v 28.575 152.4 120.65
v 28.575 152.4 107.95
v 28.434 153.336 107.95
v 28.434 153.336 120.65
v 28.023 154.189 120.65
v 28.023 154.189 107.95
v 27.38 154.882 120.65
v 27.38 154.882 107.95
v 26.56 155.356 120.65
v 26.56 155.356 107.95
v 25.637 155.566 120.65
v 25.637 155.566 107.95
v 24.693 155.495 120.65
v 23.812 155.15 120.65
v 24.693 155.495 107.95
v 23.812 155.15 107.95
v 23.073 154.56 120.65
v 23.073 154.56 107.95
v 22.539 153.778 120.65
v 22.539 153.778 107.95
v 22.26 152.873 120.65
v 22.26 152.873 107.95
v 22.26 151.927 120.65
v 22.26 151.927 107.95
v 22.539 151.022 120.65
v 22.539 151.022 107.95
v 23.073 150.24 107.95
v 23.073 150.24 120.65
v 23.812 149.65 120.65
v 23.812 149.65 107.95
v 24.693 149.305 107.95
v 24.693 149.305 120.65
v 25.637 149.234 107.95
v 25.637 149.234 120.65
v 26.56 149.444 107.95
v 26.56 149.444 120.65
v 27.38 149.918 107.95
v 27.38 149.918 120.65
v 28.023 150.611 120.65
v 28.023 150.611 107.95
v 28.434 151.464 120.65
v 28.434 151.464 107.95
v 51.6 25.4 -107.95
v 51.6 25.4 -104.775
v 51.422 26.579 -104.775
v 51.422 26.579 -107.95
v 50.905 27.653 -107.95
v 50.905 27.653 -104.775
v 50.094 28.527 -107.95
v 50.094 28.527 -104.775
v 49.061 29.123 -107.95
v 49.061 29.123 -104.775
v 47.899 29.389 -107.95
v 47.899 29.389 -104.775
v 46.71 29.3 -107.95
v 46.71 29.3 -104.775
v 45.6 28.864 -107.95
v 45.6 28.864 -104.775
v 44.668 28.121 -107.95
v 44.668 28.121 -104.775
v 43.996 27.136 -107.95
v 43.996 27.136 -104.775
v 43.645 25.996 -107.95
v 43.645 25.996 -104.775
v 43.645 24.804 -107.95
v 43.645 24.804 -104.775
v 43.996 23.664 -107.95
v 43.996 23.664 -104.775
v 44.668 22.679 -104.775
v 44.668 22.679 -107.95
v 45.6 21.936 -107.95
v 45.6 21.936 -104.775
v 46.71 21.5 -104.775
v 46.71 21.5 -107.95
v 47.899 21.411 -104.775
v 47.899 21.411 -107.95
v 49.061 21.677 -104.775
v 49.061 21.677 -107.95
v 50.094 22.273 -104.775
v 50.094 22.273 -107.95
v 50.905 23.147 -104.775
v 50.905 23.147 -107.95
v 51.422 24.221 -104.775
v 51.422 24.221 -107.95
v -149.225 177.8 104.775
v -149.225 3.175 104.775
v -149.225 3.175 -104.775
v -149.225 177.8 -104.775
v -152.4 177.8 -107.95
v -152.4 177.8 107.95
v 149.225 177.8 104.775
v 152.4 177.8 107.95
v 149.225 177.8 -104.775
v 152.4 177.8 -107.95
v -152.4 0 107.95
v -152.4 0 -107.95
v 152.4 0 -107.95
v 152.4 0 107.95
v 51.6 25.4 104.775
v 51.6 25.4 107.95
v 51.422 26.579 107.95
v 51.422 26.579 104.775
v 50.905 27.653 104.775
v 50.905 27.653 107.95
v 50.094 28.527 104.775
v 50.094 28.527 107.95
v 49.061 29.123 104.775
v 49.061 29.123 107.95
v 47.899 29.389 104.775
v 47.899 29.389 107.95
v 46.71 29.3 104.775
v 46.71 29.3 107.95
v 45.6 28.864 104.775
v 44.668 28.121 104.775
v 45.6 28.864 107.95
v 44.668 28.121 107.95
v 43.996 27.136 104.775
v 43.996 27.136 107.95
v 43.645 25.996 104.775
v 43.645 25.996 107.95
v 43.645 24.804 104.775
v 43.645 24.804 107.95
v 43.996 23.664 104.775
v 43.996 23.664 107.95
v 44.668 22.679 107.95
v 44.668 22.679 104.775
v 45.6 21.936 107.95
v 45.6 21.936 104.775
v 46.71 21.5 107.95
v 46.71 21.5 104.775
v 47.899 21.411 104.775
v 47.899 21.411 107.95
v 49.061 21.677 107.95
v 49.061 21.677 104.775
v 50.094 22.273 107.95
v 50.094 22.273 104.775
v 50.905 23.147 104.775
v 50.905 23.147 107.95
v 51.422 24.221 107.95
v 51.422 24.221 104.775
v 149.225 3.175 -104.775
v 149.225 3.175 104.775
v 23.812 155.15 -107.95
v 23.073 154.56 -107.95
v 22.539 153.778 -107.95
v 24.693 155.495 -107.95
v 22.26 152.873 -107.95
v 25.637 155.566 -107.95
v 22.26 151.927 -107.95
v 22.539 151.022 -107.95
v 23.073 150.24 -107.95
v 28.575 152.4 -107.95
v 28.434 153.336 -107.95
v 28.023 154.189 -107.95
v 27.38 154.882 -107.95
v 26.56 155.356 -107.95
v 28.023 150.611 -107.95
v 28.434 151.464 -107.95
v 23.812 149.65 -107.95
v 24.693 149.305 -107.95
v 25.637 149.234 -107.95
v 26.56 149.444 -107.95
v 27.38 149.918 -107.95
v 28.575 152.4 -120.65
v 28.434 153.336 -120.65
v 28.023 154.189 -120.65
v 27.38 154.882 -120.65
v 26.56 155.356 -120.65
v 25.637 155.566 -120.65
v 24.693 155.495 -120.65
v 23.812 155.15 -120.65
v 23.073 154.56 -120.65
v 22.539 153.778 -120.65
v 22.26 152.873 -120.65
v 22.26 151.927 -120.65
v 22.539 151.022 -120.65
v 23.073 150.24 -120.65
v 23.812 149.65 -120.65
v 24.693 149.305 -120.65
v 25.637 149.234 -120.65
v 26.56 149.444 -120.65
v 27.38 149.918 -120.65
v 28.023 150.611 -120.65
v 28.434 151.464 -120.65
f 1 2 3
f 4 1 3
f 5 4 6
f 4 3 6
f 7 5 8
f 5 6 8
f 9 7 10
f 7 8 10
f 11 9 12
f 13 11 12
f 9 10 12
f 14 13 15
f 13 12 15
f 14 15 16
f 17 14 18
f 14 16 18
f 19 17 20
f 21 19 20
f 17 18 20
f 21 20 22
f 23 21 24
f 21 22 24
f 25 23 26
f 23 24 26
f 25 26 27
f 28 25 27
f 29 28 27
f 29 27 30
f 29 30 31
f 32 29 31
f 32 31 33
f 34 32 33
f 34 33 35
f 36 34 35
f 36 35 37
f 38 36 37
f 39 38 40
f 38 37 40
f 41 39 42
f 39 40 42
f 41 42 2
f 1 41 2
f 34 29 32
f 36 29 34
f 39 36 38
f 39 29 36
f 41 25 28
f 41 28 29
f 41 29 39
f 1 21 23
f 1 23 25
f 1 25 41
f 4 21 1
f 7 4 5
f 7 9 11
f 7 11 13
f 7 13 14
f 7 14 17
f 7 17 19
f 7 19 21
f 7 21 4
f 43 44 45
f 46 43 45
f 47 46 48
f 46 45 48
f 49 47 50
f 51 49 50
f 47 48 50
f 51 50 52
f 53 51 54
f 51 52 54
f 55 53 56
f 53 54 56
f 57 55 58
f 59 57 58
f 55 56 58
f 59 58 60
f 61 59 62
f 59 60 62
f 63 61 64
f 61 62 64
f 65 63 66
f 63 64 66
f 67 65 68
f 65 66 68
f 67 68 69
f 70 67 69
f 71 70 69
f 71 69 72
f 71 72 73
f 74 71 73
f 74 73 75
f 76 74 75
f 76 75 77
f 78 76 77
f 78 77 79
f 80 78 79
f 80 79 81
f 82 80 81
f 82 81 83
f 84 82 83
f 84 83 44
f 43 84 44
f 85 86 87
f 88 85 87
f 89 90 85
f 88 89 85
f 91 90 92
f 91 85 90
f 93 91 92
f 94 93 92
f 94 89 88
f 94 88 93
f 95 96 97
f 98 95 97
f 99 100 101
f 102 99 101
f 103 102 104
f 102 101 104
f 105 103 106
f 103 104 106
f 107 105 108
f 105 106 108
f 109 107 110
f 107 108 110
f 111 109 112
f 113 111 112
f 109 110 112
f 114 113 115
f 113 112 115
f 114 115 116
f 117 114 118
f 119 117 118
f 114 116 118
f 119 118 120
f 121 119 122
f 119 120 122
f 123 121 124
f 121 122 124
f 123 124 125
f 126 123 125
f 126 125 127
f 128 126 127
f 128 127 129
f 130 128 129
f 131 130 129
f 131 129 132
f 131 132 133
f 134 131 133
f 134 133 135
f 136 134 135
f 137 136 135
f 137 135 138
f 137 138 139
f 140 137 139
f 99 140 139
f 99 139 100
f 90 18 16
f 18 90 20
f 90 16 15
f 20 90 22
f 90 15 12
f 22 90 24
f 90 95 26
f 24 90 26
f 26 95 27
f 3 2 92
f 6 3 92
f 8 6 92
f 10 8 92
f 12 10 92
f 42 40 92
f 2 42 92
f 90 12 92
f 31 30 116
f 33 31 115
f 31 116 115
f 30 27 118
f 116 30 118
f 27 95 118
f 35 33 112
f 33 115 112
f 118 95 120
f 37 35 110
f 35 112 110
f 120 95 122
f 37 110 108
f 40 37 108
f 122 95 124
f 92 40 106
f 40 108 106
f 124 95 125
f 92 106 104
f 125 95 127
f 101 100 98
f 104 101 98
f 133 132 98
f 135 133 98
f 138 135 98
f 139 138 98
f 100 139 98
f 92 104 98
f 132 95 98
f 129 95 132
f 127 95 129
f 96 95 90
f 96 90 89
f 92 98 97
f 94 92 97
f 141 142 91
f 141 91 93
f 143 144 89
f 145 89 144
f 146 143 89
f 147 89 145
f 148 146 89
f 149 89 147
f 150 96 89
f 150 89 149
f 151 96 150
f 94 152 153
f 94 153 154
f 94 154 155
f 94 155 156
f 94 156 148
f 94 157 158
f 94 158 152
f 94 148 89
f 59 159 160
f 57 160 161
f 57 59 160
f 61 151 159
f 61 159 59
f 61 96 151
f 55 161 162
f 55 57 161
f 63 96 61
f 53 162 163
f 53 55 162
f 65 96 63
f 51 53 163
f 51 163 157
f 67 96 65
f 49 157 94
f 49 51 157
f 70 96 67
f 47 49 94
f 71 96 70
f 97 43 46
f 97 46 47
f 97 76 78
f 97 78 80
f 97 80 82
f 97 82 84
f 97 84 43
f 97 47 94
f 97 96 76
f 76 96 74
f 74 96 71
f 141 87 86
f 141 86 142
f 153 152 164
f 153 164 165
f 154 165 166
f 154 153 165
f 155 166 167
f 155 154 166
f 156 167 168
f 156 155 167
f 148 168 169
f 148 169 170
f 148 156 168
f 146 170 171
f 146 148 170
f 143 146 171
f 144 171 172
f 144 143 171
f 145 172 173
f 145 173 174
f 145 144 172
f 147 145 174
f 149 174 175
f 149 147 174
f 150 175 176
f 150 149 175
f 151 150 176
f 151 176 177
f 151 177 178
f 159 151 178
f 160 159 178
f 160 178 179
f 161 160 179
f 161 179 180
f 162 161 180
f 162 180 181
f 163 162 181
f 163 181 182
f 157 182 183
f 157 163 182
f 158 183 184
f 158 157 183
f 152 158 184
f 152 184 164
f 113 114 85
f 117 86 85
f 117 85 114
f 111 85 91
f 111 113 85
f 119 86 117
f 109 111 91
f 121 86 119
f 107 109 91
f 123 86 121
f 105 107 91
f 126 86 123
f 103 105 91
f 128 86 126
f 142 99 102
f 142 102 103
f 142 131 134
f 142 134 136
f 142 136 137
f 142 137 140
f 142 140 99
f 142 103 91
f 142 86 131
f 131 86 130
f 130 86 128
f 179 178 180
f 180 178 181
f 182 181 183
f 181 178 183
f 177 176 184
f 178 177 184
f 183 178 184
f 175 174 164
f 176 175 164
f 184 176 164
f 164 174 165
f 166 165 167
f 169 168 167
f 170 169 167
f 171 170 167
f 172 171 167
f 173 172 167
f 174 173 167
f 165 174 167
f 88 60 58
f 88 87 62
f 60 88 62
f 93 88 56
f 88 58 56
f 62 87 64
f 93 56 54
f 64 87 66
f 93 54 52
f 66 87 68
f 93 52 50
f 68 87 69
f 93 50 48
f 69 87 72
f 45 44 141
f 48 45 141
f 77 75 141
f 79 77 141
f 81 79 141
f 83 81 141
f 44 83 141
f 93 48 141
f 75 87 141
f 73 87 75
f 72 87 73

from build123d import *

# Parameters (mm, degrees)
SKETCH1_W               = 298.45
SKETCH1_H               = 209.55
BOSS_EXTRUDE1_DEPTH     = 3.175
SKETCH1_3_W             = 304.8
SKETCH1_3_H             = 215.9
SKETCH1_3_W_2           = 298.45
SKETCH1_3_H_2           = 209.55
BOSS_EXTRUDE2_DEPTH     = 177.8
SKETCH2_R               = 3.175
BOSS_EXTRUDE3_DEPTH     = 12.7
SKETCH2_3_R             = 4
CUT_EXTRUDE1_DEPTH      = 13.7
CUT_EXTRUDE1_DEPTH_BACK = 216.9


with BuildPart() as part:
    # Sketch1 → Boss-Extrude1 (new body)
    with BuildSketch(Plane(origin=(0, 0, 0), x_dir=(1, 0, 0), z_dir=(0, 1, 0))):
        Rectangle(SKETCH1_W, SKETCH1_H)
    extrude(amount=BOSS_EXTRUDE1_DEPTH)

    # Sketch1<3> → Boss-Extrude2 (add)
    with BuildSketch(Plane(origin=(0, 0, 0), x_dir=(1, 0, 0), z_dir=(0, 1, 0))):
        Rectangle(SKETCH1_3_W, SKETCH1_3_H)
        Rectangle(SKETCH1_3_W_2, SKETCH1_3_H_2, mode=Mode.SUBTRACT)
    extrude(amount=BOSS_EXTRUDE2_DEPTH)

    # Sketch2 → Boss-Extrude3 (add)
    with BuildSketch(Plane.XY.offset(107.95)):
        with Locations((25.4, 152.4)):
            Circle(SKETCH2_R)
    boss_extrude3 = extrude(amount=BOSS_EXTRUDE3_DEPTH)

    # Sketch2<3> → Cut-Extrude1 (cut, two sides)
    with BuildSketch(Plane.XY.offset(107.95)) as cut_extrude1_sk:
        with Locations((47.6, 25.4)):
            Circle(SKETCH2_3_R)
    extrude(amount=CUT_EXTRUDE1_DEPTH, mode=Mode.SUBTRACT)
    extrude(cut_extrude1_sk.sketch, amount=-CUT_EXTRUDE1_DEPTH_BACK, mode=Mode.SUBTRACT)

    # Mirror1: Boss-Extrude3 across plane
    add(boss_extrude3.mirror(Plane.XY))


solid = part.part
